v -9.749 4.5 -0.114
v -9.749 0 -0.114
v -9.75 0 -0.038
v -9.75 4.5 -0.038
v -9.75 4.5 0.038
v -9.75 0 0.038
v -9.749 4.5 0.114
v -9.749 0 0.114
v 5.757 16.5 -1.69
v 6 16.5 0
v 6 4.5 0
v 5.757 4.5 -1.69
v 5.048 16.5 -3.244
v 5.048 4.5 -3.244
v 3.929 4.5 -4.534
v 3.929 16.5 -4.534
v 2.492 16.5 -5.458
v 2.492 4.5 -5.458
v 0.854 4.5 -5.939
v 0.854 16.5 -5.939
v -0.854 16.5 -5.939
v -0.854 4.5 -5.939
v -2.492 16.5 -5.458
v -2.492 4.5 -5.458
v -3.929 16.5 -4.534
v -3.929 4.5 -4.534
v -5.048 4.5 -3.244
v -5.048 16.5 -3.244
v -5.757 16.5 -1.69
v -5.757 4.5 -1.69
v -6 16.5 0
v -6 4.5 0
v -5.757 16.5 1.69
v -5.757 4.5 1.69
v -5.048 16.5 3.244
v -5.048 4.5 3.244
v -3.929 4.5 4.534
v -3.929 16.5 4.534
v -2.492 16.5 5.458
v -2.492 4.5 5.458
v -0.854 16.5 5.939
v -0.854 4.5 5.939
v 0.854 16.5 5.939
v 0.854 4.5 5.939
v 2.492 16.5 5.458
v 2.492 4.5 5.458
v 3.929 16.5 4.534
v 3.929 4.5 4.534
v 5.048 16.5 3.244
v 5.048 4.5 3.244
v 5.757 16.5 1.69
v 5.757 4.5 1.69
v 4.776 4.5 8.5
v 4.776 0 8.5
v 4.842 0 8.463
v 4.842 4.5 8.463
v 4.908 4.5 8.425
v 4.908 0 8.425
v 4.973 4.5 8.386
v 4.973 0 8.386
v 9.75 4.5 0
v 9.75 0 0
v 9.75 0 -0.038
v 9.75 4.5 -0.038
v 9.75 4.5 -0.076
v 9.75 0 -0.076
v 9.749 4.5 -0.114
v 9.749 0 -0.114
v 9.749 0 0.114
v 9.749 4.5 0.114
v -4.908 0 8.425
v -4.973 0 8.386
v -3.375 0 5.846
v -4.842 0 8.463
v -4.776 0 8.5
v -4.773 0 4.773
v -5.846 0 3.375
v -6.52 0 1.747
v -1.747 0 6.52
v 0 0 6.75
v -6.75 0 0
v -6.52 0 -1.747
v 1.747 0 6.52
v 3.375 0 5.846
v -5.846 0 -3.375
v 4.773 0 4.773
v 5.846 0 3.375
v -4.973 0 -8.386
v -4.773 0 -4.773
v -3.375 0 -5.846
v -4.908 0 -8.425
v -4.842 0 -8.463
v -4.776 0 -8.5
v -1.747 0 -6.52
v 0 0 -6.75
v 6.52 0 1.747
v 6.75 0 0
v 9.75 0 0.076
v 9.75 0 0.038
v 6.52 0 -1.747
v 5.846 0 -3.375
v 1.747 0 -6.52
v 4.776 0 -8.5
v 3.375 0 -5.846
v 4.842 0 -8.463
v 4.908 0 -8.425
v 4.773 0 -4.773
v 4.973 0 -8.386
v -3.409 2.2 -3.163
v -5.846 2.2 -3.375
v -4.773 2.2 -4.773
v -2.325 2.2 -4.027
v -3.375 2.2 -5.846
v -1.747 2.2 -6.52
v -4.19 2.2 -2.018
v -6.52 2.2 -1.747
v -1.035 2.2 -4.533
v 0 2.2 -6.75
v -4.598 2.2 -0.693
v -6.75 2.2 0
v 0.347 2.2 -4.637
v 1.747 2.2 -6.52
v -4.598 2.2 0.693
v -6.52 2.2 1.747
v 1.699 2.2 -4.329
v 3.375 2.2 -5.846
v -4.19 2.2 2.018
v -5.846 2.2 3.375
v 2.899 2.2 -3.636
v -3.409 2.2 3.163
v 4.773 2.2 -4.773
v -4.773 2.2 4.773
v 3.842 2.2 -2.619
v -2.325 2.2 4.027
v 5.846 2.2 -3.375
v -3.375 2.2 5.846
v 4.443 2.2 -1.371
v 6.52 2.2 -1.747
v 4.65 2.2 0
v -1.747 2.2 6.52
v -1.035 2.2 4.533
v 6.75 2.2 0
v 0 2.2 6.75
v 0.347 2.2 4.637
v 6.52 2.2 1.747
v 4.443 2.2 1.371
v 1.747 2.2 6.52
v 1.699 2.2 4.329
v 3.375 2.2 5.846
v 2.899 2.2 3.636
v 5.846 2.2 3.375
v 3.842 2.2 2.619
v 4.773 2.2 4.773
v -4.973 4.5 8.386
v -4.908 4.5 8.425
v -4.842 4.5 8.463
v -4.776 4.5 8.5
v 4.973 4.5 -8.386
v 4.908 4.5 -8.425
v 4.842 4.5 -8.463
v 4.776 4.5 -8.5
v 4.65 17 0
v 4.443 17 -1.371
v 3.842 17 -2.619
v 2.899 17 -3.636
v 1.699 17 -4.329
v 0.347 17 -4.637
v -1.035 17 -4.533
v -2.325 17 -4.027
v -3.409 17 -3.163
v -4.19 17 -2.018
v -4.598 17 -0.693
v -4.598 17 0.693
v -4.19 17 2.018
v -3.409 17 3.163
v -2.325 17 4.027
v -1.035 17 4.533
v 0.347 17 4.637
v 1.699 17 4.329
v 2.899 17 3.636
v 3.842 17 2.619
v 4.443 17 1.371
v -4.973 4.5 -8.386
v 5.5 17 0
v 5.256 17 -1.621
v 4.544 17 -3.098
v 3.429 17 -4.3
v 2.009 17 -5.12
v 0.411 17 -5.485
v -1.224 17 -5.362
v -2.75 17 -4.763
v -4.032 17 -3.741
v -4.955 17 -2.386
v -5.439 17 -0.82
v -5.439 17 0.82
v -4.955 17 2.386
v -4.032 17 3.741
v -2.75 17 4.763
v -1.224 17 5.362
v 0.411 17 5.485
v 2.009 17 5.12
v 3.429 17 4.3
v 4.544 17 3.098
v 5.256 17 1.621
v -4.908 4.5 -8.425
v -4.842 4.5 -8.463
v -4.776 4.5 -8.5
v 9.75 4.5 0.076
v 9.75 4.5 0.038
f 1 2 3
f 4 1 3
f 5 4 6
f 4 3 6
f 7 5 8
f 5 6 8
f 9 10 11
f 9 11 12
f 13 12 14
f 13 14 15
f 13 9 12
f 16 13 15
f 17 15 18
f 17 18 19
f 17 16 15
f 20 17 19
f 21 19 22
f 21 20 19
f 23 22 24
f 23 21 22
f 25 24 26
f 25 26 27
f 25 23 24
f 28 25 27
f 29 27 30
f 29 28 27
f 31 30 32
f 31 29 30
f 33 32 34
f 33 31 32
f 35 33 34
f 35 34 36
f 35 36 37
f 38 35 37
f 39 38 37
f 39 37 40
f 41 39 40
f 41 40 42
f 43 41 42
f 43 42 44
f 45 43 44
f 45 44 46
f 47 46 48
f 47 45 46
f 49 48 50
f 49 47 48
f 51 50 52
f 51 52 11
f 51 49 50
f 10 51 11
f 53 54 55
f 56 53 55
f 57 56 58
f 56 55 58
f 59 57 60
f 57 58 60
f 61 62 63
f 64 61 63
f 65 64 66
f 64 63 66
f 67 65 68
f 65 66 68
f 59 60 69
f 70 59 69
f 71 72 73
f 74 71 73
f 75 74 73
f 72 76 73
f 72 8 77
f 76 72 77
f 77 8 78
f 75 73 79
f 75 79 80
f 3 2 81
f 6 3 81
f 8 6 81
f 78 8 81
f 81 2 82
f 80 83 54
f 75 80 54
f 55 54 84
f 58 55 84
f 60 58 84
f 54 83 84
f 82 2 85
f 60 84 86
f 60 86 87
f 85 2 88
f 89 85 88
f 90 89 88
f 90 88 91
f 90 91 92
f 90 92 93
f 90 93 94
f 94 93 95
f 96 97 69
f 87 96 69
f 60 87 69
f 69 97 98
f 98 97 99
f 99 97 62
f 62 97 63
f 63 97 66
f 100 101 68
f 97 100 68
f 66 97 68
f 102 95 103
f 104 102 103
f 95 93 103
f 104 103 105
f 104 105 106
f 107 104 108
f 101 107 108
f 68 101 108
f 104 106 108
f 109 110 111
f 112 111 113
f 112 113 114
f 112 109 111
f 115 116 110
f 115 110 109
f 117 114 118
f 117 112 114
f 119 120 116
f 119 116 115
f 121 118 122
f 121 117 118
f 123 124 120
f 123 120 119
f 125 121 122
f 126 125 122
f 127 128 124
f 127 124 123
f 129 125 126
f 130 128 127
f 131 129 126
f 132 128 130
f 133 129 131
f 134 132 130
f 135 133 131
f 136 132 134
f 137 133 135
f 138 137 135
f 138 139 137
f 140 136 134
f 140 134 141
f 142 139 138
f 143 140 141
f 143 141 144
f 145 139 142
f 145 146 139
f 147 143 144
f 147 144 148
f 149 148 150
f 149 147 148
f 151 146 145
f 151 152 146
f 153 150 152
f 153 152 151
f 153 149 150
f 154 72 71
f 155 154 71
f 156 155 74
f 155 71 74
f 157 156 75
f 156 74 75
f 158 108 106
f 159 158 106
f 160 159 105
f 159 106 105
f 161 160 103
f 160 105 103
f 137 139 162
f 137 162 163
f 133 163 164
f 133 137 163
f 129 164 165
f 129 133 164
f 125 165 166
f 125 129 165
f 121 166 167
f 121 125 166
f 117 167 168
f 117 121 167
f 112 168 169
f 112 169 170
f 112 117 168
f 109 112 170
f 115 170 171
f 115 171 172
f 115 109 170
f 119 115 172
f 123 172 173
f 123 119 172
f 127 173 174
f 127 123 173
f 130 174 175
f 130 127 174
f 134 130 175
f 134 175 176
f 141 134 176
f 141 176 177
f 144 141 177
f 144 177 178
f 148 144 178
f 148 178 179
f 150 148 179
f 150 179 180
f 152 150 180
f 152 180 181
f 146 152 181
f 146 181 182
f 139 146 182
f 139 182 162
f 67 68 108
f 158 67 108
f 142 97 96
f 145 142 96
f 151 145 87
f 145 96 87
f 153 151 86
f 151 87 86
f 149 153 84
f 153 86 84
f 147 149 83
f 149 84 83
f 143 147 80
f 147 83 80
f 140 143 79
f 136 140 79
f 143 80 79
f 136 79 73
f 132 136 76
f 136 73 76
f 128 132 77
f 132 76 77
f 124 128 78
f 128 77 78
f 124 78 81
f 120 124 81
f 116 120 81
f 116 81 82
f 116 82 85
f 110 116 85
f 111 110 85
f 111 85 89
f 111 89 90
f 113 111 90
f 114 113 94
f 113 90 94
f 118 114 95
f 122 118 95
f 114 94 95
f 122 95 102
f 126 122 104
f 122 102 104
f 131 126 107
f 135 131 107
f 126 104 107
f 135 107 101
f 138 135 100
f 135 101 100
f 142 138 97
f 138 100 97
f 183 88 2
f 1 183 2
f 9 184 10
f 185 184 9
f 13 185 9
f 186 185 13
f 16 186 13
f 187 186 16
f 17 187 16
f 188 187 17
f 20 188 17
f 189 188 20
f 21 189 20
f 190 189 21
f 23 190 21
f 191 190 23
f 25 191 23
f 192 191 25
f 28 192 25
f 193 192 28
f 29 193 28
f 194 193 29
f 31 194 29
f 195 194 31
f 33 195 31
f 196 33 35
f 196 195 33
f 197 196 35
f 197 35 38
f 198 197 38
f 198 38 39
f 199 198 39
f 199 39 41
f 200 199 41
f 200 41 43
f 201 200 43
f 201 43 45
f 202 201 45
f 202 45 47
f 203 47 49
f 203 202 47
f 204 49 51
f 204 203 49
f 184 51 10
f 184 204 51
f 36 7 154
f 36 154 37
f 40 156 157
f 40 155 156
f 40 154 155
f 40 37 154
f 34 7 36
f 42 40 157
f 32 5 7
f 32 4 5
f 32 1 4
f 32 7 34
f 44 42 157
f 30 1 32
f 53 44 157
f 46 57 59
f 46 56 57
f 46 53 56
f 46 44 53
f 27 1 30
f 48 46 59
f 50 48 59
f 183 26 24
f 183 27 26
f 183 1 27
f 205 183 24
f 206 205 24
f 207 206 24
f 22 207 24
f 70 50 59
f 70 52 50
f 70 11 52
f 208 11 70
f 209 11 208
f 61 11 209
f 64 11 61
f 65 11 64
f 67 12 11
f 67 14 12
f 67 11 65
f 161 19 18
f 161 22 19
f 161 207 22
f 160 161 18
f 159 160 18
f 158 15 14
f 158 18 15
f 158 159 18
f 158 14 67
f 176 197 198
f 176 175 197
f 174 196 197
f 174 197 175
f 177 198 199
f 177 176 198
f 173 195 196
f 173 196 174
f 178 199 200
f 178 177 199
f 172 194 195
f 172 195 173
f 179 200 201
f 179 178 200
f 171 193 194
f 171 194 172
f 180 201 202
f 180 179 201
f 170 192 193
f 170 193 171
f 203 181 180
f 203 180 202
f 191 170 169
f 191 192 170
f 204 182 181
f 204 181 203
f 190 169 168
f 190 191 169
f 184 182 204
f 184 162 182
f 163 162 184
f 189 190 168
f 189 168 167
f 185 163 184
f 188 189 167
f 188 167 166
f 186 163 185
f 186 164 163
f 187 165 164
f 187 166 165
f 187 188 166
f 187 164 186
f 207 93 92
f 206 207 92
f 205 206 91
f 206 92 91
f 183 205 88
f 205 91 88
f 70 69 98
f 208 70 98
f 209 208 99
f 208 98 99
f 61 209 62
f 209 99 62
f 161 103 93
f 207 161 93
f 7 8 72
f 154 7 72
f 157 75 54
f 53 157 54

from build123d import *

# Parameters (mm, degrees)
SKETCH_1_R          = 4.65
EXTRUDE_1_DEPTH     = 17
SKETCH_2_R          = 6
CUT_EXTRUDE_1_DEPTH = 12.5
SKETCH_3_R          = 6.75
SKETCH_3_R_2        = 4.65
CUT_EXTRUDE_2_DEPTH = 2.2
CHAMFER_1_SIZE      = 0.5
CUT_EXTRUDE_3_DEPTH = 18


with BuildPart() as part:
    # Эскиз1 → Бобышка-Вытянуть1 (new body)
    with BuildSketch(Plane(origin=(0, 0, 0), x_dir=(1, 0, 0), z_dir=(0, 1, 0))):
        Polygon((9.814954576, 0), (4.907477288, 8.5), (-4.907477288, 8.5), (-9.814954576, 0), (-4.907477288, -8.5), (4.907477288, -8.5), align=None)
        Circle(SKETCH_1_R, mode=Mode.SUBTRACT)
    extrude(amount=EXTRUDE_1_DEPTH)

    # Эскиз2 → Вырез-Вытянуть1 (cut)
    with BuildSketch(Plane(origin=(0, 17, 0), x_dir=(1, 0, 0), z_dir=(0, 1, 0))):
        Polygon((-4.907477288, -8.5), (4.907477288, -8.5), (9.814954576, 0), (4.907477288, 8.5), (-4.907477288, 8.5), (-9.814954576, 0), align=None)
        Circle(SKETCH_2_R, mode=Mode.SUBTRACT)
    extrude(amount=-CUT_EXTRUDE_1_DEPTH, mode=Mode.SUBTRACT)

    # Эскиз3 → Вырез-Вытянуть2 (cut)
    with BuildSketch(Plane.XZ):
        Circle(SKETCH_3_R)
        Circle(SKETCH_3_R_2, mode=Mode.SUBTRACT)
    extrude(amount=-CUT_EXTRUDE_2_DEPTH, mode=Mode.SUBTRACT)

    # Фаска1
    chamfer_1_edges = [part.edges().sort_by_distance(p)[0] for p in [
        (-6, 17, 0),
    ]]
    chamfer(chamfer_1_edges, length=CHAMFER_1_SIZE)

    # Эскиз4 → Вырез-Вытянуть3 (cut, through all)
    with BuildSketch(Plane.XZ):
        with BuildLine():
            ThreePointArc((-9.749337579, -0.113651973), (-9.75, 0), (-9.749337579, 0.113651973))
            Line((-9.749337579, 0.113651973), (-9.814954576, 0))
            Line((-9.814954576, 0), (-9.749337579, -0.113651973))
        make_face()
        with BuildLine():
            ThreePointArc((-4.973094285, 8.386348027), (-4.875, 8.443747687), (-4.776243294, 8.5))
            Line((-4.776243294, 8.5), (-4.907477288, 8.5))
            Line((-4.907477288, 8.5), (-4.973094285, 8.386348027))
        make_face()
        with BuildLine():
            ThreePointArc((4.776243294, 8.5), (4.875, 8.443747687), (4.973094285, 8.386348027))
            Line((4.973094285, 8.386348027), (4.907477288, 8.5))
            Line((4.907477288, 8.5), (4.776243294, 8.5))
        make_face()
        with BuildLine():
            ThreePointArc((9.749337579, 0.113651973), (9.749834393, 0.056826952), (9.75, 0))
            ThreePointArc((9.75, 0), (9.749834393, -0.056826952), (9.749337579, -0.113651973))
            Line((9.749337579, -0.113651973), (9.814954576, 0))
            Line((9.814954576, 0), (9.749337579, 0.113651973))
        make_face()
        with BuildLine():
            Line((4.907477288, -8.5), (4.973094285, -8.386348027))
            ThreePointArc((4.973094285, -8.386348027), (4.875, -8.443747687), (4.776243294, -8.5))
            Line((4.776243294, -8.5), (4.907477288, -8.5))
        make_face()
        with BuildLine():
            Line((-4.907477288, -8.5), (-4.776243294, -8.5))
            ThreePointArc((-4.776243294, -8.5), (-4.875, -8.443747687), (-4.973094285, -8.386348027))
            Line((-4.973094285, -8.386348027), (-4.907477288, -8.5))
        make_face()
    extrude(amount=-CUT_EXTRUDE_3_DEPTH, mode=Mode.SUBTRACT)


solid = part.part
